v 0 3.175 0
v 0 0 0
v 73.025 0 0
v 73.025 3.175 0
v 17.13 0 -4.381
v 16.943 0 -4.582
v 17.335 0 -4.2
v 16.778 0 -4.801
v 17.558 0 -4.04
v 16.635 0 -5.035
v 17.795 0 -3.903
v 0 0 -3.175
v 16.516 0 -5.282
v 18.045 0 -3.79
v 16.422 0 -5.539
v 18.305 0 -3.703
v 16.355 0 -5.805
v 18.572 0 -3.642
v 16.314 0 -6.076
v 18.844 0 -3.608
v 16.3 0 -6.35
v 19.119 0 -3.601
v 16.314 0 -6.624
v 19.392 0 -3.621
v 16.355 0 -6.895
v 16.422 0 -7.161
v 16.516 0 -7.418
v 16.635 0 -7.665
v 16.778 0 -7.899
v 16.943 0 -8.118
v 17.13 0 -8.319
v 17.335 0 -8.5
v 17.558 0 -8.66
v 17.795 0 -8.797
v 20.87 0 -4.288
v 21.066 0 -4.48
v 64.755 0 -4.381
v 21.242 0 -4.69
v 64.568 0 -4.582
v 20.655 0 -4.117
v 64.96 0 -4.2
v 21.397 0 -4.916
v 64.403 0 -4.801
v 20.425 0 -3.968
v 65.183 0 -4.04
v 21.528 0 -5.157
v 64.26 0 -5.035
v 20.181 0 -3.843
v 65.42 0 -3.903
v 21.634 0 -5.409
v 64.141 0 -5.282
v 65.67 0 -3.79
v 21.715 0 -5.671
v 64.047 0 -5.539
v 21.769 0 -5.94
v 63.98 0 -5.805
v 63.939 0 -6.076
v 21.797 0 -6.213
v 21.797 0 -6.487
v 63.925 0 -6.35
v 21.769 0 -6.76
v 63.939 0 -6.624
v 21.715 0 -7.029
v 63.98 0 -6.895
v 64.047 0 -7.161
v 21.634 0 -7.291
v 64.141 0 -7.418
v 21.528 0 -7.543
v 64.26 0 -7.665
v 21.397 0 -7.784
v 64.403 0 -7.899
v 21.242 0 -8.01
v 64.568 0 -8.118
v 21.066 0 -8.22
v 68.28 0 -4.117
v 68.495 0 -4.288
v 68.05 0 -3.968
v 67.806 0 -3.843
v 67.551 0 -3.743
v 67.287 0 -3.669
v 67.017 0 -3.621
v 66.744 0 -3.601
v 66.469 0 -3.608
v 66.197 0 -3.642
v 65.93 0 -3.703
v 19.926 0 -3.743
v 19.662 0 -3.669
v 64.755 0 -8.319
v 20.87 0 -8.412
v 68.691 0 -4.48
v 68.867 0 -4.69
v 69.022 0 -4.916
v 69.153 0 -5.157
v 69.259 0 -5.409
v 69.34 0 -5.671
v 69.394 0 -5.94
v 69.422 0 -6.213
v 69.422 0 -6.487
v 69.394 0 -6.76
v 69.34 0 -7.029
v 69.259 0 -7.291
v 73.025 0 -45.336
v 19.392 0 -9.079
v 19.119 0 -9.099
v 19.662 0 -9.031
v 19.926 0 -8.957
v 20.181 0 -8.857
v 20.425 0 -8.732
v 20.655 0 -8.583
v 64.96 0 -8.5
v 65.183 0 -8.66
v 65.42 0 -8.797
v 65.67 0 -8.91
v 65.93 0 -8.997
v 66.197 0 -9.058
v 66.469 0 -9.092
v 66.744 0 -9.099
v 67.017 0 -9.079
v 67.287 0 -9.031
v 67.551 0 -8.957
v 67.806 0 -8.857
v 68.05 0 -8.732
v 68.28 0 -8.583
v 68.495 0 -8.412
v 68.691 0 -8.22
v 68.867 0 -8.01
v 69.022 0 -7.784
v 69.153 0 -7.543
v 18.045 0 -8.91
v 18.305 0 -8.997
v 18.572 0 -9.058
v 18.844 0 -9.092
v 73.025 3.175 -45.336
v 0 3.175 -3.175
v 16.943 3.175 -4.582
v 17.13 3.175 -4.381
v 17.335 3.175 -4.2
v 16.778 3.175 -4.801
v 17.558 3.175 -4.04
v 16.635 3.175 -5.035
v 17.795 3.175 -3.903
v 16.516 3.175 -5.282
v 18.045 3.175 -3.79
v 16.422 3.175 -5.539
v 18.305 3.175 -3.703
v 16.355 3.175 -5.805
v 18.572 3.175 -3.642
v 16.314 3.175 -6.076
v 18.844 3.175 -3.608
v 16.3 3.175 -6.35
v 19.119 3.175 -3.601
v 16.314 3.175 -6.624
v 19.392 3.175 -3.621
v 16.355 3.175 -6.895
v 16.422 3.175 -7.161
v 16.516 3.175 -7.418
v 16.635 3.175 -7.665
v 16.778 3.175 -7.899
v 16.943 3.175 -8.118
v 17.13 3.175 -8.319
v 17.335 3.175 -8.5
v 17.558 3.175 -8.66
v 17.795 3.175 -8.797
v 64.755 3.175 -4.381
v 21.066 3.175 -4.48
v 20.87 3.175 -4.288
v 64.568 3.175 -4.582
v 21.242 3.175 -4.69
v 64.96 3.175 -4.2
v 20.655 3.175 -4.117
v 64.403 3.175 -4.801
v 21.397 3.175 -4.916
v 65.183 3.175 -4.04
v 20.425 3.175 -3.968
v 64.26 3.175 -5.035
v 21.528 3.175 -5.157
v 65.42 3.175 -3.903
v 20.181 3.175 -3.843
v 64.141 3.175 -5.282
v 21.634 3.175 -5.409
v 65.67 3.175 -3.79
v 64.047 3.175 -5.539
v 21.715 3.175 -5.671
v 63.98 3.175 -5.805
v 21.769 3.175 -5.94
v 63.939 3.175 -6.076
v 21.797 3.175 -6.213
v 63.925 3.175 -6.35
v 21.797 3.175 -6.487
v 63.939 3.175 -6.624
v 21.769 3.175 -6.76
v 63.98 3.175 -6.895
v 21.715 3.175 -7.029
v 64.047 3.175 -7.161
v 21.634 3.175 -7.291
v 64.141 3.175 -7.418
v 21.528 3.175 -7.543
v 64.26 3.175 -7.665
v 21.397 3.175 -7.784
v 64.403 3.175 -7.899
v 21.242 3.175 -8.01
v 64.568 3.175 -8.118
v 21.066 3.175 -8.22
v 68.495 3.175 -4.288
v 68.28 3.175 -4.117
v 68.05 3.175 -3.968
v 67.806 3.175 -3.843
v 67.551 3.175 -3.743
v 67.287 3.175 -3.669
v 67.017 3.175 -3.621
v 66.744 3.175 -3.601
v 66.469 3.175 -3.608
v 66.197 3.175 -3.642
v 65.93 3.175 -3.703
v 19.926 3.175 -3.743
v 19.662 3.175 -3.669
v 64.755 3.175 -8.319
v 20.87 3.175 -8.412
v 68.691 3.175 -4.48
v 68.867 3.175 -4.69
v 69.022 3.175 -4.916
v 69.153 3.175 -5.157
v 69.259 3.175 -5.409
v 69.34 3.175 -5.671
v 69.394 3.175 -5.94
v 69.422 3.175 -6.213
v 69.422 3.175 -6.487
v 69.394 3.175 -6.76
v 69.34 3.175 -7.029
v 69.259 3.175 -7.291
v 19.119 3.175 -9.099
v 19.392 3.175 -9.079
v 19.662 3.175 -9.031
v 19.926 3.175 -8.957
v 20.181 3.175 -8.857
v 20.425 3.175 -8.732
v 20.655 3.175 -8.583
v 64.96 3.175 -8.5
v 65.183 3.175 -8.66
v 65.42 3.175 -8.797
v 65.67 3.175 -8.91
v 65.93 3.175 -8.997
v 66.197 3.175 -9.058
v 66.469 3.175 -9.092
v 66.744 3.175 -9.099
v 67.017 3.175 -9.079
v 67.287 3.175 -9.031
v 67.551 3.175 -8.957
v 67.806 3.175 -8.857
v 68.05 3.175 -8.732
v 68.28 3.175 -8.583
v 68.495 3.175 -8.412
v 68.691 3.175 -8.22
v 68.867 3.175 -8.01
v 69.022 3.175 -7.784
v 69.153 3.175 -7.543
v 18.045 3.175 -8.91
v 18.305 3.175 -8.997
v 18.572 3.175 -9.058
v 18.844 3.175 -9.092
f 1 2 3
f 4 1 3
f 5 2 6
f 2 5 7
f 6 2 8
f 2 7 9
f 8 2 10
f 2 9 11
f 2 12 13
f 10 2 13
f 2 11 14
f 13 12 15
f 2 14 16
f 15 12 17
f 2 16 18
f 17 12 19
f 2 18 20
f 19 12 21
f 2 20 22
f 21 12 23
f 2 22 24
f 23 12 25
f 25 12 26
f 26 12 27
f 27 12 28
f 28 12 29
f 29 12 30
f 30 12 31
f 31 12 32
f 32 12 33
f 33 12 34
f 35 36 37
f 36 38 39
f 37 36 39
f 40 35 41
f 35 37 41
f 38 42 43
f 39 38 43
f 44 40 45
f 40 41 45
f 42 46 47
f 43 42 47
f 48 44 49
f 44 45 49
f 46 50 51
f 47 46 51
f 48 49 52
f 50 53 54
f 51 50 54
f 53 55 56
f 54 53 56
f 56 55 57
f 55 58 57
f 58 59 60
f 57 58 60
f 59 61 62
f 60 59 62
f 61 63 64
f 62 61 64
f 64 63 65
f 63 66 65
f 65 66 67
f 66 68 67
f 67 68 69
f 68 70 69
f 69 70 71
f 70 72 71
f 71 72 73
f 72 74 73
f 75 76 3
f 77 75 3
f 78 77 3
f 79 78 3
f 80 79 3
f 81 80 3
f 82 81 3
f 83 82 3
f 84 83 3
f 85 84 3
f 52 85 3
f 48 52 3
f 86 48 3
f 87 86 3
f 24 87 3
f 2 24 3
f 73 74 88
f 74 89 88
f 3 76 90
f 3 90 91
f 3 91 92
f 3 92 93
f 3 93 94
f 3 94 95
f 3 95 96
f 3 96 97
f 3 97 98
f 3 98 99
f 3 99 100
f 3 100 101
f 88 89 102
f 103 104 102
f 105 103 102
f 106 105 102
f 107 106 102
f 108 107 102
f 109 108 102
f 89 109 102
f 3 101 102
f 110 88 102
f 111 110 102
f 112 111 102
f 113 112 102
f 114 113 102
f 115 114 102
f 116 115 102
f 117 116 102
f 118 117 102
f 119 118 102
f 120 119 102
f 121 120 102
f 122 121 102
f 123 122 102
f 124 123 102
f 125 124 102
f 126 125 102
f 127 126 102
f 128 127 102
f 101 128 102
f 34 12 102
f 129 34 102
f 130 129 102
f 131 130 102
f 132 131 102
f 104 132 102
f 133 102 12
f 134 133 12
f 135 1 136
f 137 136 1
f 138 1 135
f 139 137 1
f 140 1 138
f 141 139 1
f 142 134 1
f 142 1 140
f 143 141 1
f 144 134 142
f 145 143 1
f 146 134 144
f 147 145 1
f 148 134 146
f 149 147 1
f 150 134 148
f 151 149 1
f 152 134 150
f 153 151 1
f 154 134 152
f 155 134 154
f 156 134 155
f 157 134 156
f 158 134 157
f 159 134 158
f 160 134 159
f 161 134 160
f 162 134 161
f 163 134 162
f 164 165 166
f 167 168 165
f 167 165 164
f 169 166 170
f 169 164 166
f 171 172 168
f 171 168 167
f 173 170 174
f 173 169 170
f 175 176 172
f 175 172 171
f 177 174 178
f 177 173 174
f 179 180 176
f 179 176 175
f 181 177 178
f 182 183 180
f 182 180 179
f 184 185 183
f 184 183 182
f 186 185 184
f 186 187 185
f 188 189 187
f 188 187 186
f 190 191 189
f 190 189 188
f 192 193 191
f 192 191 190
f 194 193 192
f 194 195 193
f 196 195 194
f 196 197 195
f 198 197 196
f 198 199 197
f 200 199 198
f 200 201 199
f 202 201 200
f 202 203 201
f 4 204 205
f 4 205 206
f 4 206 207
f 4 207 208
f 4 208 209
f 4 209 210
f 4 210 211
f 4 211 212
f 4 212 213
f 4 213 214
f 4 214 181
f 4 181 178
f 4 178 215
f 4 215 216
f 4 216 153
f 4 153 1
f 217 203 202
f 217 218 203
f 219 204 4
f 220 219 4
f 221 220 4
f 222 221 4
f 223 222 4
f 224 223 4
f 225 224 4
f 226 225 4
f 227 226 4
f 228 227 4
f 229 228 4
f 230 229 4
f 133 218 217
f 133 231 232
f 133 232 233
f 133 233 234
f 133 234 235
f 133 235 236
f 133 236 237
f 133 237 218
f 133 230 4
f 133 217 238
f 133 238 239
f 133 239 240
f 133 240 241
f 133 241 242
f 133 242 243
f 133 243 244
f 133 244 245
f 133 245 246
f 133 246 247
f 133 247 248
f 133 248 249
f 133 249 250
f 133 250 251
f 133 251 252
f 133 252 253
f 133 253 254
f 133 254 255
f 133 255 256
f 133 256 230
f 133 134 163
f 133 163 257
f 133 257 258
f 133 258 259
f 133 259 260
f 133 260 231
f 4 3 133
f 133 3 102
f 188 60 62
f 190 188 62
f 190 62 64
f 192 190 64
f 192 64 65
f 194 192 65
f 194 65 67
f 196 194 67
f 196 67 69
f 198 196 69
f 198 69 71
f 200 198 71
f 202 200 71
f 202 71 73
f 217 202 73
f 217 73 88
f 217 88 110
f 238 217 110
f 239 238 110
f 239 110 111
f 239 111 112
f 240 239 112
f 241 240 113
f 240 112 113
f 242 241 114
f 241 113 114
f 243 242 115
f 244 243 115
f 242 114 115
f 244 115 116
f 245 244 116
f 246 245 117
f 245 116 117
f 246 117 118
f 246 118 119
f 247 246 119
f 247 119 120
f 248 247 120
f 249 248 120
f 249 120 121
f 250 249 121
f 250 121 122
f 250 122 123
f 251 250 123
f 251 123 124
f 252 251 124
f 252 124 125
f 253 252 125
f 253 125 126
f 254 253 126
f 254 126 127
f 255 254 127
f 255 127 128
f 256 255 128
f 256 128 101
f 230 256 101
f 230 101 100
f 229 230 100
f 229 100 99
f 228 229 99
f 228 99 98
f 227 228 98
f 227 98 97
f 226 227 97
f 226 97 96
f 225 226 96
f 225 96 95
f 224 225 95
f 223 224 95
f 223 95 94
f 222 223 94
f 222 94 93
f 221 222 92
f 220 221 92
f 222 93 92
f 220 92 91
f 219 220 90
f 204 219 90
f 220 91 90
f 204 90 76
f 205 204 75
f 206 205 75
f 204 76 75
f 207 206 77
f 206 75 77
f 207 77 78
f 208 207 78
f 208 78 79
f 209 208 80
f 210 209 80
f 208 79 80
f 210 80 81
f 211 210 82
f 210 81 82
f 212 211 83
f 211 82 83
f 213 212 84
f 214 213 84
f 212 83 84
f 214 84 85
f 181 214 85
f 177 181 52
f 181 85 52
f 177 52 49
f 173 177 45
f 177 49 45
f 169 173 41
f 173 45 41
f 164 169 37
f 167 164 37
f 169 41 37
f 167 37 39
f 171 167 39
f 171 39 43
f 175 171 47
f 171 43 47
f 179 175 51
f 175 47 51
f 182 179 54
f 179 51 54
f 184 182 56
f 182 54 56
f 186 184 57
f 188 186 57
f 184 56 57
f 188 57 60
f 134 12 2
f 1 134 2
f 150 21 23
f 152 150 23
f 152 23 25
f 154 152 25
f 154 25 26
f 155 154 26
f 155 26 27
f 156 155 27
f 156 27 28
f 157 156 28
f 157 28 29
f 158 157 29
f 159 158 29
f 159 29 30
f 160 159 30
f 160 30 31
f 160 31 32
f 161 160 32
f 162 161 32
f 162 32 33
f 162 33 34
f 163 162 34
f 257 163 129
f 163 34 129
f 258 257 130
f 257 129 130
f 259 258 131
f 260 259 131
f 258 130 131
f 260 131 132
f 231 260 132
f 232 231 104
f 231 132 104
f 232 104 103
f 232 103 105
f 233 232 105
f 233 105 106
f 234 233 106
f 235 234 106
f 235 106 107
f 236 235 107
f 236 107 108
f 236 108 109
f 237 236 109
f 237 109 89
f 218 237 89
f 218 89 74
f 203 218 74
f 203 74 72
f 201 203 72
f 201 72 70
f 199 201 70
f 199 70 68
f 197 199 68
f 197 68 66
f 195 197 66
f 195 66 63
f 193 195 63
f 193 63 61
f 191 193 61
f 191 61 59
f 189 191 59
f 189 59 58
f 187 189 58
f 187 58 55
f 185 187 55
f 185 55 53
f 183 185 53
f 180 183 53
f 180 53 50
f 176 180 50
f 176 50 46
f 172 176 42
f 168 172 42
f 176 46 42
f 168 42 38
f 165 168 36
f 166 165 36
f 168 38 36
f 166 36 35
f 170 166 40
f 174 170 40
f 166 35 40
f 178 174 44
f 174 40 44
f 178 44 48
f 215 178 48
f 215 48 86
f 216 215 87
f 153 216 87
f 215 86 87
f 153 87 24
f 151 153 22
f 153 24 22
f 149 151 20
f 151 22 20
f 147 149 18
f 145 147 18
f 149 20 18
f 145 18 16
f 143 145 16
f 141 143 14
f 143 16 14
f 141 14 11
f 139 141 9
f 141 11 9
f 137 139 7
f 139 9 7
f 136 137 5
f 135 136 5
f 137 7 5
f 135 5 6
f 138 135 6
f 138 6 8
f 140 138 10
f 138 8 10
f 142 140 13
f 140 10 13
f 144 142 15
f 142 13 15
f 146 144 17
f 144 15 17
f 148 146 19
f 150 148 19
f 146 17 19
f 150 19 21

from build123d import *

# Parameters (mm, degrees)
BOSS_EXTRUDE1_DEPTH  = 3.175
M5_CLEARANCE_HOLE1_D = 5.5


with BuildPart() as part:
    # Sketch1 → Boss-Extrude1 (new body)
    with BuildSketch(Plane(origin=(0, 0, 0), x_dir=(1, 0, 0), z_dir=(0, 1, 0))):
        Polygon((0, 0), (73.025, 0), (73.025, 45.336003408), (0, 3.175), align=None)
    extrude(amount=BOSS_EXTRUDE1_DEPTH)

    # M5 Clearance Hole1 (through all)
    with Locations(Plane(origin=(0, 3.175, 0), x_dir=(1, 0, 0), z_dir=(0, 1, 0))):
        with Locations((19.05, 6.35), (66.675, 6.35)):
            Hole(M5_CLEARANCE_HOLE1_D / 2)


solid = part.part
